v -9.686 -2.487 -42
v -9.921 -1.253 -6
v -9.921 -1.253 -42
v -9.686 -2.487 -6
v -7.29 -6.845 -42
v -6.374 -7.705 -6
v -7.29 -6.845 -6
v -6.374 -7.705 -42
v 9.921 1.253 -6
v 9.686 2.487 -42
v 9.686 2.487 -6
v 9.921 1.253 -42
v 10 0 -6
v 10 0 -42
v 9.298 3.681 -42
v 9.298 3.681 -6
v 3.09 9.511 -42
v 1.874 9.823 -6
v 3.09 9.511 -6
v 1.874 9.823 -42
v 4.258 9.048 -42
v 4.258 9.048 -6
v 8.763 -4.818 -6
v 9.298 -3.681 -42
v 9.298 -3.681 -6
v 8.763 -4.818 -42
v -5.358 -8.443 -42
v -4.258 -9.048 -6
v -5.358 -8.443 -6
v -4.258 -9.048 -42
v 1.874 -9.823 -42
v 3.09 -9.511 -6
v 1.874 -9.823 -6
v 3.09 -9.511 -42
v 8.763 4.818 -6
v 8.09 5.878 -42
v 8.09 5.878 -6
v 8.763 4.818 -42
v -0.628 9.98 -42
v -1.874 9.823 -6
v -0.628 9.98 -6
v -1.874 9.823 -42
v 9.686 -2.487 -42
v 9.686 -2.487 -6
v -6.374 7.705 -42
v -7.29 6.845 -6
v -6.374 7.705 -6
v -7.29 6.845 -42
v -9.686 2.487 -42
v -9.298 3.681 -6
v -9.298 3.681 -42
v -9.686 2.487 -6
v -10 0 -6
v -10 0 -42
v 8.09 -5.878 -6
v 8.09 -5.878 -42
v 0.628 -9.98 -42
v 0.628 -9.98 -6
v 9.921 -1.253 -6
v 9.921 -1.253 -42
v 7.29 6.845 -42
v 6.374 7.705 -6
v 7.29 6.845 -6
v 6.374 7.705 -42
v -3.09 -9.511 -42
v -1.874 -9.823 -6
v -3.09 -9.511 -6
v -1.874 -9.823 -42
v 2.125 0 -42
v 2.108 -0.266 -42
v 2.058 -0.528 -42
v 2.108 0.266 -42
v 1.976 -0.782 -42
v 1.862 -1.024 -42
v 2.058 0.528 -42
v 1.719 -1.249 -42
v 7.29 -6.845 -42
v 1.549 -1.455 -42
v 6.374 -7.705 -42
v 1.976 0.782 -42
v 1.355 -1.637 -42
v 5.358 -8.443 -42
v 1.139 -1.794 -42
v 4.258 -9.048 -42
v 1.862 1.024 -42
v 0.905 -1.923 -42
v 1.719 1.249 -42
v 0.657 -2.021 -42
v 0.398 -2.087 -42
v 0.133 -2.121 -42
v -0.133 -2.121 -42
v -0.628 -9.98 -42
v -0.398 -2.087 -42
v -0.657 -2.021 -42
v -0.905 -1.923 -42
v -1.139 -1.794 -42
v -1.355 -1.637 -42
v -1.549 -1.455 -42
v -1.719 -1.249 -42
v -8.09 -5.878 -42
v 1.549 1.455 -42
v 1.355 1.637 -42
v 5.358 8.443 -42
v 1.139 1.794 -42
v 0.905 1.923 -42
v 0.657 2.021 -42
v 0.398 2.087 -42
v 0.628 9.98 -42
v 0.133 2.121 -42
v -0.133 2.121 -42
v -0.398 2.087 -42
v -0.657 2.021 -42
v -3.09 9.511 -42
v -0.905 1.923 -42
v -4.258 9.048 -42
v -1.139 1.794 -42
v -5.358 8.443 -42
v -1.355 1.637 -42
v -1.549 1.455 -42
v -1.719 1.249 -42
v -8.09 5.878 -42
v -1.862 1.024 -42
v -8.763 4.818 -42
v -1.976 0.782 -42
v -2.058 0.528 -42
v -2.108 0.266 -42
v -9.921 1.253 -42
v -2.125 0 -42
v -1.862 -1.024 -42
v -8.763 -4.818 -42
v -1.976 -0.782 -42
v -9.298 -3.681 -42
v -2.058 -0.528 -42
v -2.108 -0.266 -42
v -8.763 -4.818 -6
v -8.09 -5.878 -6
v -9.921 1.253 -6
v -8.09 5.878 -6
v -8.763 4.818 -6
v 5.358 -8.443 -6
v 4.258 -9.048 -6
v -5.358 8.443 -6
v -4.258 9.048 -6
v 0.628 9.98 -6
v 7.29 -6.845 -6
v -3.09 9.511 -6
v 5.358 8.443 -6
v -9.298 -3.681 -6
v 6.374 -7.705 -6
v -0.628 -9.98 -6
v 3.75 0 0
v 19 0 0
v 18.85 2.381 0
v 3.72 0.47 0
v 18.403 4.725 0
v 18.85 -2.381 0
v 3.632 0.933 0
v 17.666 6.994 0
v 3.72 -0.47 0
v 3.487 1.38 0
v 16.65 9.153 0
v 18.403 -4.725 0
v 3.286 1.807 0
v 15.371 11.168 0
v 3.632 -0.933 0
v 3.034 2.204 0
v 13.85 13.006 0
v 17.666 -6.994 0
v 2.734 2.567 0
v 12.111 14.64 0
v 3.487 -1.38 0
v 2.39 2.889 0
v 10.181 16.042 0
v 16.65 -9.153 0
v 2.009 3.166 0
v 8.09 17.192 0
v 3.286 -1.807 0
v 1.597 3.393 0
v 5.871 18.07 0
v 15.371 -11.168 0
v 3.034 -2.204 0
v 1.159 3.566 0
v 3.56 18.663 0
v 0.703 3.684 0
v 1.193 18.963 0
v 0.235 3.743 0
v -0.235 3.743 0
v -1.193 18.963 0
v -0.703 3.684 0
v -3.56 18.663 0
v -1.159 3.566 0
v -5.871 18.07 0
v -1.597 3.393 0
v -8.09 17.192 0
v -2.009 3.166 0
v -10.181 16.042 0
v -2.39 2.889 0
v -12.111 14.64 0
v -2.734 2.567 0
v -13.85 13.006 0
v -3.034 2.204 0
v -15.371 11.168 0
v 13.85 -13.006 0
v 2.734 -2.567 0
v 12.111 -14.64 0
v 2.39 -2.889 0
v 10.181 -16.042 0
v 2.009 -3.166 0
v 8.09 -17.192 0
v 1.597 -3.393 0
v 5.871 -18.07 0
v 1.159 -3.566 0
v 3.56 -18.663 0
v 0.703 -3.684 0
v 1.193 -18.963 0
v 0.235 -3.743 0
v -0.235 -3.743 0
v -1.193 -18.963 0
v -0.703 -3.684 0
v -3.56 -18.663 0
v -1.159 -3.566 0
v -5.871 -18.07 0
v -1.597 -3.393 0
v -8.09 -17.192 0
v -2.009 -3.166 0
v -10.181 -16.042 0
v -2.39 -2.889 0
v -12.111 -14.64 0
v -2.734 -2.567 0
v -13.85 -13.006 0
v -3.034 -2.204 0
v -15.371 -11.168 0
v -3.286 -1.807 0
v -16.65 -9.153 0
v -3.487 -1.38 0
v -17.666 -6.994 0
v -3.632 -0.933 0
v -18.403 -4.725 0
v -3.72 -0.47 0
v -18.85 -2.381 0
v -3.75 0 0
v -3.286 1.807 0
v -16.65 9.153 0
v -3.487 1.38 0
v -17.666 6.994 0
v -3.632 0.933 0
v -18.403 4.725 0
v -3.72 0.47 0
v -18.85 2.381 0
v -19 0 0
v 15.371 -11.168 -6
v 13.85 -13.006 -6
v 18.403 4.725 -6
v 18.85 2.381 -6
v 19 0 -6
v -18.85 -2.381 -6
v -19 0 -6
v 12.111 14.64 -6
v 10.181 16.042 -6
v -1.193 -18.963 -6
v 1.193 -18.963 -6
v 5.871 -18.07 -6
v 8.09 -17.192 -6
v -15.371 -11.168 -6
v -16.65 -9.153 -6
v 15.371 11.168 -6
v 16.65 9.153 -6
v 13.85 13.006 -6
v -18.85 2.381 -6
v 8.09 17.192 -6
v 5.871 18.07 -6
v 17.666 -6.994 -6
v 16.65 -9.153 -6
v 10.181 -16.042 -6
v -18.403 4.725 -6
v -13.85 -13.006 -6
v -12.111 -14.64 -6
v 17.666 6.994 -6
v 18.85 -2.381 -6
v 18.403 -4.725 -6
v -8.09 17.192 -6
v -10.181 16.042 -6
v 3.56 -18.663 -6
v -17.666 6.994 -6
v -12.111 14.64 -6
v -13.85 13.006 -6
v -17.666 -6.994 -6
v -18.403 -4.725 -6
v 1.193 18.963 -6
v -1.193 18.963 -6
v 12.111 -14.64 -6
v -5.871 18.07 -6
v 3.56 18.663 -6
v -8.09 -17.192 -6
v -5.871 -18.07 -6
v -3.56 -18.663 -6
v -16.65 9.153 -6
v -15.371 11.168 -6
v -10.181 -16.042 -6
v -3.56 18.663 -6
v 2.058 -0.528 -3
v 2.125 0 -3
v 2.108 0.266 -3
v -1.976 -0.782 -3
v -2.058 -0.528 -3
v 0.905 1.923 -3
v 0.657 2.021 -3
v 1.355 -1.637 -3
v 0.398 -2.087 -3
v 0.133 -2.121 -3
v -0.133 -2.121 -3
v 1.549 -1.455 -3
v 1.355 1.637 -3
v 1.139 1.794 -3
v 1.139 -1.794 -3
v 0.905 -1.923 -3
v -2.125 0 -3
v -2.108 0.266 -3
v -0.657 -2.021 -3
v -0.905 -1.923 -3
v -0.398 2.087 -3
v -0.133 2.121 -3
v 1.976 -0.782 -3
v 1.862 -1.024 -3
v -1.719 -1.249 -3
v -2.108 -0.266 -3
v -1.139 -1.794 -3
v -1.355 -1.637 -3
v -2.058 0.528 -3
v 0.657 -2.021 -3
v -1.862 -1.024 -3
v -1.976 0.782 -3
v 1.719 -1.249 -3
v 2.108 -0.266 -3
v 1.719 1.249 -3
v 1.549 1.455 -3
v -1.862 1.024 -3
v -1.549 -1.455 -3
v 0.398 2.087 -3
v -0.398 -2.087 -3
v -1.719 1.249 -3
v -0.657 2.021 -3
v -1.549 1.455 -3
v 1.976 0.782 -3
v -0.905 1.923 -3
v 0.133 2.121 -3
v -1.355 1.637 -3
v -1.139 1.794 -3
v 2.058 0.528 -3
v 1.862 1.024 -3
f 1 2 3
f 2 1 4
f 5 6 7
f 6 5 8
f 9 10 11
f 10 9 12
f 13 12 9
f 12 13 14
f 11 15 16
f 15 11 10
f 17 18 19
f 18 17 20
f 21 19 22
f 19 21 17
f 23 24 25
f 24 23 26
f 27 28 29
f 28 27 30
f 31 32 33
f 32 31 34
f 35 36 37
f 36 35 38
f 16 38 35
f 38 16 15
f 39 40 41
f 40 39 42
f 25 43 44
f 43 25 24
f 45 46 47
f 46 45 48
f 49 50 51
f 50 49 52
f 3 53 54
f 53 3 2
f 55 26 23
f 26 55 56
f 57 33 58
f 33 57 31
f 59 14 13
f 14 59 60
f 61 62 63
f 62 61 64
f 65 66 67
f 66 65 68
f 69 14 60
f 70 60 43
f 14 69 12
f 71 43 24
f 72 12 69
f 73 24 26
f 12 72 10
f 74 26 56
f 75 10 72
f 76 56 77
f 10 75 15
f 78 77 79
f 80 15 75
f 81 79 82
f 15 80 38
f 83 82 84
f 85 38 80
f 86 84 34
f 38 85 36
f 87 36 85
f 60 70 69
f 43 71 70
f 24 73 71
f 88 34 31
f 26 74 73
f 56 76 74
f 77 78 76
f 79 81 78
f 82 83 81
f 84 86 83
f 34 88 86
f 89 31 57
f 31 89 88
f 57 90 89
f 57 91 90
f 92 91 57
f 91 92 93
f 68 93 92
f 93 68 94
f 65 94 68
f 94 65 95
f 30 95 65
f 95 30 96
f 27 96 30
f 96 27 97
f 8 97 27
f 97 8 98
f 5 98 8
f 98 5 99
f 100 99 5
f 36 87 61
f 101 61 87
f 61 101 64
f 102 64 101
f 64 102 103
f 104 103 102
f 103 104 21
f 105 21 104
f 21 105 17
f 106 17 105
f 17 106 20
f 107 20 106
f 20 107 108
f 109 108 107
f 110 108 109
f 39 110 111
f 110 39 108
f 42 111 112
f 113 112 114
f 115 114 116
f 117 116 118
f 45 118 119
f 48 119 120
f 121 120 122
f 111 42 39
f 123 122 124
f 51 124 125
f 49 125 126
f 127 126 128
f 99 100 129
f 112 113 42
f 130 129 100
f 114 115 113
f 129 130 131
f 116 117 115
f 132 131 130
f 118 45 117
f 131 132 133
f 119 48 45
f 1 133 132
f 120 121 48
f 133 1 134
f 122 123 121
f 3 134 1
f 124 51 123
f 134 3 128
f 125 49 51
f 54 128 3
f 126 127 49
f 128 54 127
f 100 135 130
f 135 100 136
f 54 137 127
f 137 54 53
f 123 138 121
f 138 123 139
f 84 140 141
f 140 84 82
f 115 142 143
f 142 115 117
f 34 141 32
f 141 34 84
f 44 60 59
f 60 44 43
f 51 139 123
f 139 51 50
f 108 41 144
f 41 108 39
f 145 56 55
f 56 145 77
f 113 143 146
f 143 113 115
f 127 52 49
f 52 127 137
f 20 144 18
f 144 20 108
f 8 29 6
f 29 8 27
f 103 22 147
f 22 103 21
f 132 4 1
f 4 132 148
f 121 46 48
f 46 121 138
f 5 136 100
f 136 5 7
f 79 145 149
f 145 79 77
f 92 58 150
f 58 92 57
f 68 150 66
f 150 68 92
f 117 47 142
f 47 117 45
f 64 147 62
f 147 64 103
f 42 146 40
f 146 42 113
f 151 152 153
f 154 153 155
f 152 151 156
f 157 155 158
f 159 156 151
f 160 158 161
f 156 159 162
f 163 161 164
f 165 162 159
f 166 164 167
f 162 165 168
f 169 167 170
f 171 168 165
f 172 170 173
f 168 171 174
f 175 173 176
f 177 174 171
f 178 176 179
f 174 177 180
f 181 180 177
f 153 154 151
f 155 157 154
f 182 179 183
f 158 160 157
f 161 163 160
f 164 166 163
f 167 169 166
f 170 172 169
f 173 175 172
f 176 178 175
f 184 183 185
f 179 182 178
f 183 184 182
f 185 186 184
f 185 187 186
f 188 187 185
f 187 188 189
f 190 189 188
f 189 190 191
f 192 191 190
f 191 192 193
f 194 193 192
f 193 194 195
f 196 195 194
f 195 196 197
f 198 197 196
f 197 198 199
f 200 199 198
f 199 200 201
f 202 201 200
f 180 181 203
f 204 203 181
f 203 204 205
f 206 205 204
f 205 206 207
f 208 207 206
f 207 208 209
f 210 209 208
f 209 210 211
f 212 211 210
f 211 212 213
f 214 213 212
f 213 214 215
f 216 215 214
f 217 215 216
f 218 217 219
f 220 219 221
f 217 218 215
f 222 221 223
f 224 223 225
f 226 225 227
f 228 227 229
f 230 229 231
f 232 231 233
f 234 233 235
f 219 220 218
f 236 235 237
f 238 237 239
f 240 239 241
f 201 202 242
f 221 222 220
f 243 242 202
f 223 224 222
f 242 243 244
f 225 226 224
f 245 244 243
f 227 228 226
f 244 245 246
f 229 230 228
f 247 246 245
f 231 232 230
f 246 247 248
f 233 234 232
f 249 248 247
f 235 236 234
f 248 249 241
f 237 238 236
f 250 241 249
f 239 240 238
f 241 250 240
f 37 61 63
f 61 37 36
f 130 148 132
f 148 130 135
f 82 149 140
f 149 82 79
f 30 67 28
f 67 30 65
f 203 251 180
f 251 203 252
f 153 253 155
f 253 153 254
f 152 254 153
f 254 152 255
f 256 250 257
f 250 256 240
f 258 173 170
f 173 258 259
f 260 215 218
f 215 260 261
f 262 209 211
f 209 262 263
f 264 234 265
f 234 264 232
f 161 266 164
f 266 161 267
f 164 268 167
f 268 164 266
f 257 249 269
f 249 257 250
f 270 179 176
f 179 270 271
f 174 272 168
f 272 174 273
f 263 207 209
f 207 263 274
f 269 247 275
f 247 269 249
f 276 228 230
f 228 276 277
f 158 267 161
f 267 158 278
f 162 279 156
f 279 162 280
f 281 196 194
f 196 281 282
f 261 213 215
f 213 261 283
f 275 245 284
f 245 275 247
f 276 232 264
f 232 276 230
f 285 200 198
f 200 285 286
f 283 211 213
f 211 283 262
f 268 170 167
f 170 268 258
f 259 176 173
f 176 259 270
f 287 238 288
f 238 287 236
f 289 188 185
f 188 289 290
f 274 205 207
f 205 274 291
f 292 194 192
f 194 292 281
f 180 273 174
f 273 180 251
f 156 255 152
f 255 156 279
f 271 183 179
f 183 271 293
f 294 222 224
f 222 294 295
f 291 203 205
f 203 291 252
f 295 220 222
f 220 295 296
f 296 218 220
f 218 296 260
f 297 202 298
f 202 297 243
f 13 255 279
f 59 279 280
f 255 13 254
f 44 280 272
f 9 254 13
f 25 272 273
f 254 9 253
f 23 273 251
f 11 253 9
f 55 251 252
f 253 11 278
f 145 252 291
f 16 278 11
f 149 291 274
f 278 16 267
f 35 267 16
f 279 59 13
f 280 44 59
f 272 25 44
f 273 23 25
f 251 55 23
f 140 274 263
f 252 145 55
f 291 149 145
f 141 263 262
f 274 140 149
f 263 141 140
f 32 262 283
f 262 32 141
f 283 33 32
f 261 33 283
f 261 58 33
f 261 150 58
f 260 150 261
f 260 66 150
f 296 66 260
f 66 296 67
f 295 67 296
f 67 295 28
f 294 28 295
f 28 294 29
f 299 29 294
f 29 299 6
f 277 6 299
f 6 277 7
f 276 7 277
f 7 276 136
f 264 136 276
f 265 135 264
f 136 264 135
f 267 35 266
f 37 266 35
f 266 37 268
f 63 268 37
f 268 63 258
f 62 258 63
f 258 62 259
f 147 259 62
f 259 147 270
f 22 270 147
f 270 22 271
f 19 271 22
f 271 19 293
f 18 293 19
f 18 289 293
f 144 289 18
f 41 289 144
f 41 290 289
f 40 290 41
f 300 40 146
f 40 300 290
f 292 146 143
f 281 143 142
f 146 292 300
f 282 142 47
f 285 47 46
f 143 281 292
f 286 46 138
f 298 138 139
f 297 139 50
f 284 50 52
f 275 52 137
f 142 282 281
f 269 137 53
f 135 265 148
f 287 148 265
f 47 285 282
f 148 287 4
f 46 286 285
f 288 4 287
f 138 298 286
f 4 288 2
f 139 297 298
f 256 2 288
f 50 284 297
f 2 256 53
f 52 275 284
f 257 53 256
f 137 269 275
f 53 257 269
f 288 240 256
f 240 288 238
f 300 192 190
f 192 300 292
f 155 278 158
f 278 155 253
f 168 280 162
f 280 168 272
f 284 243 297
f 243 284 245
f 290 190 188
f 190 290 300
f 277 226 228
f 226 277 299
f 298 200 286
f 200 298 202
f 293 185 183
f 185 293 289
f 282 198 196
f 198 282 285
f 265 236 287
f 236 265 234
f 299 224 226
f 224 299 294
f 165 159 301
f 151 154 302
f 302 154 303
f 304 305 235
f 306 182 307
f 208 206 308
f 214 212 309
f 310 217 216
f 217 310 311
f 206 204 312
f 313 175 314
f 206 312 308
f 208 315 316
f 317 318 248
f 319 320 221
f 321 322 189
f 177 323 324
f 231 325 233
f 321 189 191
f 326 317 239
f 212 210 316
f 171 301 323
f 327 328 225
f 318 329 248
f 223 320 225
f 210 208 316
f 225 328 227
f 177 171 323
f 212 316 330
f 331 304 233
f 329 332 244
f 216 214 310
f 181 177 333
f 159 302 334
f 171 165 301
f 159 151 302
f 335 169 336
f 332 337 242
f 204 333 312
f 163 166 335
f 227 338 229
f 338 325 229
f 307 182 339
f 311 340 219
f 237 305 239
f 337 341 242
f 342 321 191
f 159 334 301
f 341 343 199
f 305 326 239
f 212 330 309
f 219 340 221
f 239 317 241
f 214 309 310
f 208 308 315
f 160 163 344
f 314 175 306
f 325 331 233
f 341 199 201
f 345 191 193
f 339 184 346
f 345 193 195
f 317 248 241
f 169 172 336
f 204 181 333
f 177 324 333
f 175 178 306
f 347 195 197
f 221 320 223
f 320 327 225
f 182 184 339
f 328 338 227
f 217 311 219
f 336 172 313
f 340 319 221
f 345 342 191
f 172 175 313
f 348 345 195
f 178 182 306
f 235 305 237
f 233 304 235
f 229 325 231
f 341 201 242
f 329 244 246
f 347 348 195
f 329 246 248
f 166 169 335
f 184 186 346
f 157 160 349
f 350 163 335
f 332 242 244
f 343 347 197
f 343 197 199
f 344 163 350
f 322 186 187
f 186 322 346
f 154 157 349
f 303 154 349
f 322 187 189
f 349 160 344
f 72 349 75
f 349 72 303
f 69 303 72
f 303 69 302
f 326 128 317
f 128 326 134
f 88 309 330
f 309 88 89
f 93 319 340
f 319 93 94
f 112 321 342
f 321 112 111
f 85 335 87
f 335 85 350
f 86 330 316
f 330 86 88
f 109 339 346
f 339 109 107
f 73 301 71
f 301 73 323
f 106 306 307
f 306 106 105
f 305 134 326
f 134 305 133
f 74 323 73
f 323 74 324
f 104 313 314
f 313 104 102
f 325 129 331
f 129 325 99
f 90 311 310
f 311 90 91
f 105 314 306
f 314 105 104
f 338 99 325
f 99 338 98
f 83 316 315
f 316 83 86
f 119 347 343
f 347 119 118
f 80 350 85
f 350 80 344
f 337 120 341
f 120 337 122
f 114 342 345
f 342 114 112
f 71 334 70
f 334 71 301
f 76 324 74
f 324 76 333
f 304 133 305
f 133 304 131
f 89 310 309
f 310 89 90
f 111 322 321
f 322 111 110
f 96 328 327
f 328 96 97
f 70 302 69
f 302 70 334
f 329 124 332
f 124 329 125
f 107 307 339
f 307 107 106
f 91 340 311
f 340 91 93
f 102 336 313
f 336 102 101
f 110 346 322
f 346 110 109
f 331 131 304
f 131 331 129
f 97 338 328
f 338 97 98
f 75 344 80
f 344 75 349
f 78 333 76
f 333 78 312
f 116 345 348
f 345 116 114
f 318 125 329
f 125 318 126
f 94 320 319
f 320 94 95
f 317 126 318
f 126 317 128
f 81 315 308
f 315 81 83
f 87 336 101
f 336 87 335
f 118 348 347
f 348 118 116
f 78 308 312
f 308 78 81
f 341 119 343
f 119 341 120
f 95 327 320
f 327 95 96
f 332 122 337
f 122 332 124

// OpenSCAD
$fn = 50;


difference() {
	union() {
		translate(v = [0, 0, -42.0000000000]) {
			cylinder(h = 42, r = 10.0000000000);
		}
		translate(v = [0, 0, -6.0000000000]) {
			cylinder(h = 6, r = 19.0000000000);
		}
	}
	union() {
		translate(v = [0, 0, 0]) {
			rotate(a = [0, 0, 0]) {
				difference() {
					union() {
						#translate(v = [0, 0, -42.0000000000]) {
							cylinder(h = 42, r = 2.0000000000);
						}
						#translate(v = [0, 0, -3]) {
							cylinder(h = 3, r = 10.0000000000, r1 = 2.1250000000, r2 = 3.7500000000);
						}
						#translate(v = [0, 0, -42.0000000000]) {
							cylinder(h = 42, r = 2.1250000000);
						}
						#translate(v = [0, 0, -42.0000000000]) {
							cylinder(h = 42, r = 2.0000000000);
						}
					}
					union();
				}
			}
		}
	}
}
